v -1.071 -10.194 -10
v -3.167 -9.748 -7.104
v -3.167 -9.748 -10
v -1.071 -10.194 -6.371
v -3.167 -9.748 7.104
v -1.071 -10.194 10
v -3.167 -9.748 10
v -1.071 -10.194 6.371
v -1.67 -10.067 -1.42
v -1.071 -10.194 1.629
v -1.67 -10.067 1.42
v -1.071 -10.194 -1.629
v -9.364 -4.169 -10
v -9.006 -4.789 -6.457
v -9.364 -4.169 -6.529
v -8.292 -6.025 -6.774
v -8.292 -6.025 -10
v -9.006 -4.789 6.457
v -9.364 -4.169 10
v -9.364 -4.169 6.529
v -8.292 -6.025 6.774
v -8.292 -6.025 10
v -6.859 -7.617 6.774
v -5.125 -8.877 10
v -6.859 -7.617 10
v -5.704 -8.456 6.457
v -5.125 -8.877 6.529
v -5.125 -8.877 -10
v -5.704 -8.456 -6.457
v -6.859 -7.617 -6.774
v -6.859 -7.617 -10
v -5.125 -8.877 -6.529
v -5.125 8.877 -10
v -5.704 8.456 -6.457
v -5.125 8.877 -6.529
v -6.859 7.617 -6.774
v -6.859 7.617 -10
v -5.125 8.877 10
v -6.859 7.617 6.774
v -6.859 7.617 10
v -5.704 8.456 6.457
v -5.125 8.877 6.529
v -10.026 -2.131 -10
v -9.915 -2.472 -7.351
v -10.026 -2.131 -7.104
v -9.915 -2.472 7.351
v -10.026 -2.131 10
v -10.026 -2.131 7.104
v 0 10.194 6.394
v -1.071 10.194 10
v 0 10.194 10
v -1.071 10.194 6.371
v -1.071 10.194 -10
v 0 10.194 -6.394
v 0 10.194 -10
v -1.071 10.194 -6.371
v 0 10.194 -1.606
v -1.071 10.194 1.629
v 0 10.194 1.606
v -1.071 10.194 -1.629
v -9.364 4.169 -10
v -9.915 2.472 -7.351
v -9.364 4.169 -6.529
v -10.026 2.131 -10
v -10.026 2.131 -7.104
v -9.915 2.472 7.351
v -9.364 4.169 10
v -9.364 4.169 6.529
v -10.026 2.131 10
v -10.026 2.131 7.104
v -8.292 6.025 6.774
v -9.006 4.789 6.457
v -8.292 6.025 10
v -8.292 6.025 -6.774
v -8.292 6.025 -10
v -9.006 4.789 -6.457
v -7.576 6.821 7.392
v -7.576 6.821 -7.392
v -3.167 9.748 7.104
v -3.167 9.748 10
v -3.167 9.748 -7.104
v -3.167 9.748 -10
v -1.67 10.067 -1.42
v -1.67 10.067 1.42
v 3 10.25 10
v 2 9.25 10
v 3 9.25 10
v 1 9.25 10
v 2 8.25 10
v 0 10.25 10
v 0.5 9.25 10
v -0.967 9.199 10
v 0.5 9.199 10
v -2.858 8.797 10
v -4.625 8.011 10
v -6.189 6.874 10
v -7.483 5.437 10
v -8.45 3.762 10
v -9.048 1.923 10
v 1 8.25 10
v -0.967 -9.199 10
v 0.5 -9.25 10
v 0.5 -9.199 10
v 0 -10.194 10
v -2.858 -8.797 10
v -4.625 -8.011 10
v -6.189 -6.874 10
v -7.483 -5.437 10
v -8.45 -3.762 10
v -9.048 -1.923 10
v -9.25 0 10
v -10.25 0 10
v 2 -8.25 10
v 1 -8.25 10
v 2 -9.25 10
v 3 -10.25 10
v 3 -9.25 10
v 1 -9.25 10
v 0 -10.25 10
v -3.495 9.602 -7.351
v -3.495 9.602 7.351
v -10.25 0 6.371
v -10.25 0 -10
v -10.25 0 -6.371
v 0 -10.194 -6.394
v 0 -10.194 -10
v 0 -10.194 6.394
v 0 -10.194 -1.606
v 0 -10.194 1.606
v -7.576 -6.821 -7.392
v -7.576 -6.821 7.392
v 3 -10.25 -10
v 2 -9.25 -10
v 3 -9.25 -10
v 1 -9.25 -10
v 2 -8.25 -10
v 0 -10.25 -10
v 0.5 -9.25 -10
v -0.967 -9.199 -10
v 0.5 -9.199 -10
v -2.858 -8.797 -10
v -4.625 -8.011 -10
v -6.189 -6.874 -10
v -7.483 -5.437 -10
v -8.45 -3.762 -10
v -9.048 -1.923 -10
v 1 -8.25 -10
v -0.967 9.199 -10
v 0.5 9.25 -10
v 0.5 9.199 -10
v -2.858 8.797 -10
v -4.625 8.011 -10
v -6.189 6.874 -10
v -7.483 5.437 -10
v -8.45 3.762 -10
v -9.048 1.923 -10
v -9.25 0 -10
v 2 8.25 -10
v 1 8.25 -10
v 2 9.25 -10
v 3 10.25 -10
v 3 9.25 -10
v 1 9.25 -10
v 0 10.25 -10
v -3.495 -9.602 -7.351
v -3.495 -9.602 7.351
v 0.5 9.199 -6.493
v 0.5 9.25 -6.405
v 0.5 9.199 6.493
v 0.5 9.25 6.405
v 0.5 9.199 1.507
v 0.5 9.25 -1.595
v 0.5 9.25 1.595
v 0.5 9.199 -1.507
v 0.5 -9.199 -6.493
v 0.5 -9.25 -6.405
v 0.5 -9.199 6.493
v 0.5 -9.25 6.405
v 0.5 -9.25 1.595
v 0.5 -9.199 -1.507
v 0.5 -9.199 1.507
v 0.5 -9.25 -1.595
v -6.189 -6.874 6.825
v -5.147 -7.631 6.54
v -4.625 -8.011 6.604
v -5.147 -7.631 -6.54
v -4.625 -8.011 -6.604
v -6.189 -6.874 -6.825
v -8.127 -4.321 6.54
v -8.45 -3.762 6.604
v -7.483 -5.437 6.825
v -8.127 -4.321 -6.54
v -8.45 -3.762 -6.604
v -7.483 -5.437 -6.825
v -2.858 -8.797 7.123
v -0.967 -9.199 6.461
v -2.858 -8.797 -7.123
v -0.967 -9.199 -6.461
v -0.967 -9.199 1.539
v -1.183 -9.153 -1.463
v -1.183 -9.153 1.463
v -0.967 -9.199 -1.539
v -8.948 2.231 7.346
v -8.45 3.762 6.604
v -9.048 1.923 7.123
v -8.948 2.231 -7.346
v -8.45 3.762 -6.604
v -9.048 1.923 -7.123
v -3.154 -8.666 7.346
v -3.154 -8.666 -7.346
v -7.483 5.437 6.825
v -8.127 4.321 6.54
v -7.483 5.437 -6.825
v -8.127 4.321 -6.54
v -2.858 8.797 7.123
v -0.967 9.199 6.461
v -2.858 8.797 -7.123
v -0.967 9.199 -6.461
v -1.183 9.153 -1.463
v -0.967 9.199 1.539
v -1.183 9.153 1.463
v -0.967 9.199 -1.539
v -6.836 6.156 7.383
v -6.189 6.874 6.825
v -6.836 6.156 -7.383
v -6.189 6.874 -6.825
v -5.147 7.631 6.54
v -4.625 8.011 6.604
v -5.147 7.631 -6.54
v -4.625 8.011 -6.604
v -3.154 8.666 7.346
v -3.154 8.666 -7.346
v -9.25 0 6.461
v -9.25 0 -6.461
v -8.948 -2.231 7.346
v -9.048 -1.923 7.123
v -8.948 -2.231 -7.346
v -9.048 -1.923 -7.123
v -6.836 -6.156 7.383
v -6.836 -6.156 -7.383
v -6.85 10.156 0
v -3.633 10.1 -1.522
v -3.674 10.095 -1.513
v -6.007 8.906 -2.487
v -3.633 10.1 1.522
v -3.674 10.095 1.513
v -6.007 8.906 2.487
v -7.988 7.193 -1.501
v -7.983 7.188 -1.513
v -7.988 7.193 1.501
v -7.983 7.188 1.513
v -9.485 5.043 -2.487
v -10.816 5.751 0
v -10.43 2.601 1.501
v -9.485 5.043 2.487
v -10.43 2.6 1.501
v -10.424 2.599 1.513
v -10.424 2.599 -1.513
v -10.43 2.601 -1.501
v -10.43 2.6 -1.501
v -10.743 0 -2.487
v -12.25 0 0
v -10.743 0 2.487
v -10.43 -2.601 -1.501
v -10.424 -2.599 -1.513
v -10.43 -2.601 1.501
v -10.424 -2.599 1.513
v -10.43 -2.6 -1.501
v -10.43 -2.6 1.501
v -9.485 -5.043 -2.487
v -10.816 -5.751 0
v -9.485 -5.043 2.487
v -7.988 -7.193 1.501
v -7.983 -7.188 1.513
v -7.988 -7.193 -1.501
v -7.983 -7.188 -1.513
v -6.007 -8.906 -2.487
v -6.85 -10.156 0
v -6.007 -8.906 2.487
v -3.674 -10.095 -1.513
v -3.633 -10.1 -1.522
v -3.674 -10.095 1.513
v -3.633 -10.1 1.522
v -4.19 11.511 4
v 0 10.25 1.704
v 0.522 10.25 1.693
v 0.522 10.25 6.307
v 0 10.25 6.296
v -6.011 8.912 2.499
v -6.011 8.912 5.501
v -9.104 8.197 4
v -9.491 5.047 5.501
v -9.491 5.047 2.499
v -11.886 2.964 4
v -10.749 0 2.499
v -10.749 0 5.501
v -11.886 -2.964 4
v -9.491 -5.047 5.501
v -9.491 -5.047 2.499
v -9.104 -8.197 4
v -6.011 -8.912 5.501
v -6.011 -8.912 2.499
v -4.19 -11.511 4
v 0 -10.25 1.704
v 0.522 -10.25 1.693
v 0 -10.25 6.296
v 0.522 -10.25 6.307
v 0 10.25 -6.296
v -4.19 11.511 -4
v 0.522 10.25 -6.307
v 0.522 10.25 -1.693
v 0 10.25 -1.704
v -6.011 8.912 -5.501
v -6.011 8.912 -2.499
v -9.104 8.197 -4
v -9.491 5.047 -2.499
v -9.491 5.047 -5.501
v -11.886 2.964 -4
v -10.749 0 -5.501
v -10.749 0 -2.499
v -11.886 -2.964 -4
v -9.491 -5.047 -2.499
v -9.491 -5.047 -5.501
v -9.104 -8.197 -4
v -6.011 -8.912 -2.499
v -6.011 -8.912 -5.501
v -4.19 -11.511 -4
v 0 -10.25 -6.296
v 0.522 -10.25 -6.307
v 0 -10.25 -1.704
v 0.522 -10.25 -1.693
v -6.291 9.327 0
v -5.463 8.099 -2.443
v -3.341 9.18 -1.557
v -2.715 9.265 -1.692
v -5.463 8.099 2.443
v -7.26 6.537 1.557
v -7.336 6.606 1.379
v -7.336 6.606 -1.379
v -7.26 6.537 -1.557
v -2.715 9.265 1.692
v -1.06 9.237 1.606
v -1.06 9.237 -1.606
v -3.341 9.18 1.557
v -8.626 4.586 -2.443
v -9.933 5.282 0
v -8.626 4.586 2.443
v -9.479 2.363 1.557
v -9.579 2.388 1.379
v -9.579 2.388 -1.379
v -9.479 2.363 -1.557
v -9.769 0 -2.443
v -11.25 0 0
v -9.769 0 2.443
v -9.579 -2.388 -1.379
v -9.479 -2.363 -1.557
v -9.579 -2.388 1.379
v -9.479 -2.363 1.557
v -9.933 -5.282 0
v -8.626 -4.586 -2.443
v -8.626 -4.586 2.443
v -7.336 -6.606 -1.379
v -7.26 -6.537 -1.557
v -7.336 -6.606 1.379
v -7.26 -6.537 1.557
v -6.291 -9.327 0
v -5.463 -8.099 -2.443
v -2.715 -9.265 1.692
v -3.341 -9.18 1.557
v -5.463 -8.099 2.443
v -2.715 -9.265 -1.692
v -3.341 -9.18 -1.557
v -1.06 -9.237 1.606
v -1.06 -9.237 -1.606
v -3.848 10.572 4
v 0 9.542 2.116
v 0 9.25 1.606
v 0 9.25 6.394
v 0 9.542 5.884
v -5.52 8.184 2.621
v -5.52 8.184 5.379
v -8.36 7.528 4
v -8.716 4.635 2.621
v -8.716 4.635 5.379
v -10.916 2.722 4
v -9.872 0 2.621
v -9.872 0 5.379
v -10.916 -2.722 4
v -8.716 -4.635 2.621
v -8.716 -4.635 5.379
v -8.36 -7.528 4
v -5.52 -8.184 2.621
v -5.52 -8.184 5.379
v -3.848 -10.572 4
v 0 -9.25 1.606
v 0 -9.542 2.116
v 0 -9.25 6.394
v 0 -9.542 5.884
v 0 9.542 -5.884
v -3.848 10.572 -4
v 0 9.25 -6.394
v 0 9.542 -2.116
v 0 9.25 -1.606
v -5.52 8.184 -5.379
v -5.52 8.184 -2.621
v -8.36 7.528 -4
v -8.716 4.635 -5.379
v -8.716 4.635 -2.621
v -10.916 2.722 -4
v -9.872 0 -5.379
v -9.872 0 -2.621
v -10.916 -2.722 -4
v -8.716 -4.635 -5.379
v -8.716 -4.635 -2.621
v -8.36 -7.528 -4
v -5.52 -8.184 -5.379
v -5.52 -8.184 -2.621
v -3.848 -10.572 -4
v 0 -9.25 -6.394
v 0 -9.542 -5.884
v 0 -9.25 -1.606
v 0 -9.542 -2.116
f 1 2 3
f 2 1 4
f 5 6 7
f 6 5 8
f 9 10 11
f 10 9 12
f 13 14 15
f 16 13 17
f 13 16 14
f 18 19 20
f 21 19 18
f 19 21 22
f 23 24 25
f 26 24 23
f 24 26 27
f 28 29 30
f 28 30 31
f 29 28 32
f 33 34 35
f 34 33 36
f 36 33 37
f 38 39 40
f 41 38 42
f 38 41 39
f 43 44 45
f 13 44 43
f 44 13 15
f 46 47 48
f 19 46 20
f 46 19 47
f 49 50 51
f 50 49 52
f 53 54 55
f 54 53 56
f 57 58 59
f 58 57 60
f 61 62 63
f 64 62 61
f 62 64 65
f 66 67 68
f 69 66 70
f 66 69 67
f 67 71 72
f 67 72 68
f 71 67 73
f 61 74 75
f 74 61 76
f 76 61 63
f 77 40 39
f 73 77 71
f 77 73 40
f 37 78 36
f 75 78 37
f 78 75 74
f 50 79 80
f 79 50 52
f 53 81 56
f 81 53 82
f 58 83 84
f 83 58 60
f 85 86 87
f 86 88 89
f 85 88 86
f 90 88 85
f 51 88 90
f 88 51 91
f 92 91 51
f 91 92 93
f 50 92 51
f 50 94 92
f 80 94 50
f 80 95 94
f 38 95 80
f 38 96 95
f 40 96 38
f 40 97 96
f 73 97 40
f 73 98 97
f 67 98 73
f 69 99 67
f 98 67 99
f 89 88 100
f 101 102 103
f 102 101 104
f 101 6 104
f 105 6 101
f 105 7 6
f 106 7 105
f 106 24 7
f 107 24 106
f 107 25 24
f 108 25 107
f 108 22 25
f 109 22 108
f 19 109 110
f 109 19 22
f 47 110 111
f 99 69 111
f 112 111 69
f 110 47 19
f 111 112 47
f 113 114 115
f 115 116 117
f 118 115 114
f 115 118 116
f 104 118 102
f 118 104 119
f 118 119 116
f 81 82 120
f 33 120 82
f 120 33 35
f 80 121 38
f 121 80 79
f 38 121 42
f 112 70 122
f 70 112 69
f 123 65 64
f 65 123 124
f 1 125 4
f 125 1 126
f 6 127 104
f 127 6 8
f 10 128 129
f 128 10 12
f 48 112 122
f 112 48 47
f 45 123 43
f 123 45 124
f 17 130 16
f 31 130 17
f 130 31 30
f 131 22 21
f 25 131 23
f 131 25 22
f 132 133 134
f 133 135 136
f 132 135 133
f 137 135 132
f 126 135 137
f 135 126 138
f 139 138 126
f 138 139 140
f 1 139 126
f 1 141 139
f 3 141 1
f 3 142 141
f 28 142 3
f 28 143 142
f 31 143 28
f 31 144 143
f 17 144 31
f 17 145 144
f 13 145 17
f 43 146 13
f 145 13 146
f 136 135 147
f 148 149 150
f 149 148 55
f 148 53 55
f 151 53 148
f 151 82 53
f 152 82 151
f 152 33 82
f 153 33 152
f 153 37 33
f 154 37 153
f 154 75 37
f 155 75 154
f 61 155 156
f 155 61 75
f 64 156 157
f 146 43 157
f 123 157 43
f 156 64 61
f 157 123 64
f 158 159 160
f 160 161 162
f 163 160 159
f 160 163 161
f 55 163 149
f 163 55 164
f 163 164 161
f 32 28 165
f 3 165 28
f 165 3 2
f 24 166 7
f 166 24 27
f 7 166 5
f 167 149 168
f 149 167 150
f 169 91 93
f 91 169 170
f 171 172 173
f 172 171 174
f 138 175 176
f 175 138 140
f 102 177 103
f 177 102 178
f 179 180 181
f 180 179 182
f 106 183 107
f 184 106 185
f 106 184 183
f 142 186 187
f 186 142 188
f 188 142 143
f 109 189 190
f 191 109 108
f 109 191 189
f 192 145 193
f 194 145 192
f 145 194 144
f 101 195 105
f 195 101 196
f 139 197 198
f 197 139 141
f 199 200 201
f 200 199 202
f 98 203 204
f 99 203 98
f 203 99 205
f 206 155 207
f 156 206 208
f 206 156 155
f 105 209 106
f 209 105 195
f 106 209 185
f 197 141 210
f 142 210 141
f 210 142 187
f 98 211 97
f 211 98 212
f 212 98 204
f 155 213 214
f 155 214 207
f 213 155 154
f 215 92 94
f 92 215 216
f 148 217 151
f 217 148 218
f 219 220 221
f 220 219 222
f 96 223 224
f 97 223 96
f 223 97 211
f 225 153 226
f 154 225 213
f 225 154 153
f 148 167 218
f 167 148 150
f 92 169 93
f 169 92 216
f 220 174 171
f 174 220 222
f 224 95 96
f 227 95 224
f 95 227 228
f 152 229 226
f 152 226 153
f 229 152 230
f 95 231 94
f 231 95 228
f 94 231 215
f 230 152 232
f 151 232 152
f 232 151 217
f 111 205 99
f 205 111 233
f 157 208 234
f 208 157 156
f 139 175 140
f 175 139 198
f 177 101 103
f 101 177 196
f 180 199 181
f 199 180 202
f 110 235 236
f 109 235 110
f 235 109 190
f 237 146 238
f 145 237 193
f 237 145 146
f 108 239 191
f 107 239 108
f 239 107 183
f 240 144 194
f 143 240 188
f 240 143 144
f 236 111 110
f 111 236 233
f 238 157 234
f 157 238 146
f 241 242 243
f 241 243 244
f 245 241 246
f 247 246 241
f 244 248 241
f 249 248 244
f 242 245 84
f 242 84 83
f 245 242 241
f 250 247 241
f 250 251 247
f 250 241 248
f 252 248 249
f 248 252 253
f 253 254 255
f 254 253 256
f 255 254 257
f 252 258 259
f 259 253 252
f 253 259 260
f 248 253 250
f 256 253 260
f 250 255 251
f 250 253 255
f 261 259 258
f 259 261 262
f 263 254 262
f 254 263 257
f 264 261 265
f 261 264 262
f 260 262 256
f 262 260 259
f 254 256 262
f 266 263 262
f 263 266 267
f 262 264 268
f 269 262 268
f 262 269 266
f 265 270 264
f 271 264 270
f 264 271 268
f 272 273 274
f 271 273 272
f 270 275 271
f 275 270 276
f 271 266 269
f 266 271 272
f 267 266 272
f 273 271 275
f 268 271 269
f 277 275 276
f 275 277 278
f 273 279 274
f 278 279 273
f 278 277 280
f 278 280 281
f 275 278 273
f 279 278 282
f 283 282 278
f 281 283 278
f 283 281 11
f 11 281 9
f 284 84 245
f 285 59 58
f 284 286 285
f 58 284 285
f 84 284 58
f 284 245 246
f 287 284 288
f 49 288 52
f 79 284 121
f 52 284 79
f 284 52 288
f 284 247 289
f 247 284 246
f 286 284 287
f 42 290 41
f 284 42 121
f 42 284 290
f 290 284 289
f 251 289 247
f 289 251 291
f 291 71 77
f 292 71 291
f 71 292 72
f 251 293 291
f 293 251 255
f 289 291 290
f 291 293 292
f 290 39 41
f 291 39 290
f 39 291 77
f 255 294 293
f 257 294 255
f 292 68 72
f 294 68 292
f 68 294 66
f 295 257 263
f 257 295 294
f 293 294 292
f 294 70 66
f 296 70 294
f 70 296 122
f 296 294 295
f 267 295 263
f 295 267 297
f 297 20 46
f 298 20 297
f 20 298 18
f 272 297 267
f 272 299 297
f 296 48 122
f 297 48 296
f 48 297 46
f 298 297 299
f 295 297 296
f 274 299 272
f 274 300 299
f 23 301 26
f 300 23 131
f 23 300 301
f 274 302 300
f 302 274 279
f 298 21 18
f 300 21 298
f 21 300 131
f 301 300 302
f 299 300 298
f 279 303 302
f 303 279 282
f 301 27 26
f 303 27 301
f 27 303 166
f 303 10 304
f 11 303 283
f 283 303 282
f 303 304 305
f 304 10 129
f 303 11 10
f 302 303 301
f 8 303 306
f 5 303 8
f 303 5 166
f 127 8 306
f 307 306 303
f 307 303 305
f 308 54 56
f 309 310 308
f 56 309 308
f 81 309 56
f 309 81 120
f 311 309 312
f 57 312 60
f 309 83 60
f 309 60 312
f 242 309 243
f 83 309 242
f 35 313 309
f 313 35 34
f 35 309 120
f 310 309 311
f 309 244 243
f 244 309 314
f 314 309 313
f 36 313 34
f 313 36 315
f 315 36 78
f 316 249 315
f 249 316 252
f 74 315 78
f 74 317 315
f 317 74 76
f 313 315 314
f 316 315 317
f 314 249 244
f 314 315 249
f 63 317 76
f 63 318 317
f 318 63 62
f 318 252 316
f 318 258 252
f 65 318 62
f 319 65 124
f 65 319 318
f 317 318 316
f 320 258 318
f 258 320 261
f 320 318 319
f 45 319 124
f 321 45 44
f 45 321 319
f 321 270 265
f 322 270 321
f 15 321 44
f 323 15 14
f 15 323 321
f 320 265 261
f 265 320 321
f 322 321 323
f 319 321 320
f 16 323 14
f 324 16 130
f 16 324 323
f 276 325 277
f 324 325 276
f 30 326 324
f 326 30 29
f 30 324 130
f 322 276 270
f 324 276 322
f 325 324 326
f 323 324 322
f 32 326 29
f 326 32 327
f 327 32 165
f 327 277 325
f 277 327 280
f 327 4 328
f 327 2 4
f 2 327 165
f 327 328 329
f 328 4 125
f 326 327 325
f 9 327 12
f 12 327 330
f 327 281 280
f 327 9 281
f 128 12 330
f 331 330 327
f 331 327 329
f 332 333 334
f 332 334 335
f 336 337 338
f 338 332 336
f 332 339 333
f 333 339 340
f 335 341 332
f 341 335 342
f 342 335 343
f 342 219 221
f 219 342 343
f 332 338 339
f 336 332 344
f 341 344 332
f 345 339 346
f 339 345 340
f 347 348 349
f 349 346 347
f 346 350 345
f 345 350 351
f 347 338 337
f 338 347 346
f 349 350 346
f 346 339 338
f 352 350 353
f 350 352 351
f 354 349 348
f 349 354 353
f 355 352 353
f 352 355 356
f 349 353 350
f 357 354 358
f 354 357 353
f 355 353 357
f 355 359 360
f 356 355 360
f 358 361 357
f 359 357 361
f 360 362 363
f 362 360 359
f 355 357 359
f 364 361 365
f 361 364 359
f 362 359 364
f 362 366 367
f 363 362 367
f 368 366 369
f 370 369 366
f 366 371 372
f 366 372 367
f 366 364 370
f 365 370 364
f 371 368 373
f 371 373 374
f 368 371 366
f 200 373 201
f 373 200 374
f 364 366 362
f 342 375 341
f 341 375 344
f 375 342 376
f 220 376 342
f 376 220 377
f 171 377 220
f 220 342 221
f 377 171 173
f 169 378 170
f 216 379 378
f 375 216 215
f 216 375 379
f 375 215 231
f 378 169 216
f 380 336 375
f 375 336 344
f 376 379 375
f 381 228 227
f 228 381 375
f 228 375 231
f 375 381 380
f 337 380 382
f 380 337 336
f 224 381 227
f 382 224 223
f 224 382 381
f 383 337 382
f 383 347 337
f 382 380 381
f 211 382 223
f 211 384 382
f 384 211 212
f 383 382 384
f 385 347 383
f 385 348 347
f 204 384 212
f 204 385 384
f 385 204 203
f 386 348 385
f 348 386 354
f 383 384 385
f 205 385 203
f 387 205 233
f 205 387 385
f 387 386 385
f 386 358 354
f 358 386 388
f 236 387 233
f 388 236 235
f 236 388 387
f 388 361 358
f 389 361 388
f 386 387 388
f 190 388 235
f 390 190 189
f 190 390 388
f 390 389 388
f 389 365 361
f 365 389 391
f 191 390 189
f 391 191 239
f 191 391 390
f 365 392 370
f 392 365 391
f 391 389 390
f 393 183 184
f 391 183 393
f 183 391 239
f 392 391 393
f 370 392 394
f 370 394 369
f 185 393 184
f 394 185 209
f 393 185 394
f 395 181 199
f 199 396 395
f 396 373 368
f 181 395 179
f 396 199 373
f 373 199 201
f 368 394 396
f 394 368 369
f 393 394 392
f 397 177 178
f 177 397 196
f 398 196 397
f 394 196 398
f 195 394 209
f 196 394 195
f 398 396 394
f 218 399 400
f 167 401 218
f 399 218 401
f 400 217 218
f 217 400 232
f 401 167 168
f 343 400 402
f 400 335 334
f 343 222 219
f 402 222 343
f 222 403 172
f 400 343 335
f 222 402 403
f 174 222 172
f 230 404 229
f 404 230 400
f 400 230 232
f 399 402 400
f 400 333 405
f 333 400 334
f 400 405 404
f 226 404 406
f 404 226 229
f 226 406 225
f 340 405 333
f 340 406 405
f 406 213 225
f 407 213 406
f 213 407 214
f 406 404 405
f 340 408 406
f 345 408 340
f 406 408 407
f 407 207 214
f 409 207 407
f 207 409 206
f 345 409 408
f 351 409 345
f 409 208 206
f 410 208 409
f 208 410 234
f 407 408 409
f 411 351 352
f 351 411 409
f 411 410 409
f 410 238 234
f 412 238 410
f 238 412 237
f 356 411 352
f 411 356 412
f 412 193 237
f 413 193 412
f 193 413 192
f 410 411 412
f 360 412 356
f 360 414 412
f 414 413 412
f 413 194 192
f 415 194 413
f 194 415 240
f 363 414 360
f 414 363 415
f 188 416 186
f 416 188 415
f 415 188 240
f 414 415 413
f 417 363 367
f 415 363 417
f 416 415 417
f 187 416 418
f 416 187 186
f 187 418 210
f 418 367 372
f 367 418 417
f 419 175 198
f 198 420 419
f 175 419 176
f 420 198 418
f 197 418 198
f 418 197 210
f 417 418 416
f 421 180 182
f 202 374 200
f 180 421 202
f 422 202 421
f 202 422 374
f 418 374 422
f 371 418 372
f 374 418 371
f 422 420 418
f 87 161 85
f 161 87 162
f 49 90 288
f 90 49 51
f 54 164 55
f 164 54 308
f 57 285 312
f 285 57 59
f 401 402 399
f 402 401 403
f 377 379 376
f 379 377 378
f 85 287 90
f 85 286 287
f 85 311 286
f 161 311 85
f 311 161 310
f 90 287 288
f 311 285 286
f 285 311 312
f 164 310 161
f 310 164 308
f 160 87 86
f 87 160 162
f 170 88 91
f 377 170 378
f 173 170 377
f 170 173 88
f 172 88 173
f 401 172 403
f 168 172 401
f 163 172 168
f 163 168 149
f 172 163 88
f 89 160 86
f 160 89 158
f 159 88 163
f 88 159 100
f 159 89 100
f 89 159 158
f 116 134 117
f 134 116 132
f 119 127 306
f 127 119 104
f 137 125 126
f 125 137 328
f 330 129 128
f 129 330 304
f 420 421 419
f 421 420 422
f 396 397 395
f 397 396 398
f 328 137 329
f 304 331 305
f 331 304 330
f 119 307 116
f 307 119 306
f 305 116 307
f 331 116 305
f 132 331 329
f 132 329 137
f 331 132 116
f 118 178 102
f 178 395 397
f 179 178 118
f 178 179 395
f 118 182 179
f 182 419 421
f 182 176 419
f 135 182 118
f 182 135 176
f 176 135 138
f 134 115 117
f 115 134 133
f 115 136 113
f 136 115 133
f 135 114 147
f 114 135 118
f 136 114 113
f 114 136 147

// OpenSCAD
baseWidth = 14.5+3*2;
baseHeight = 1.0;
baseLength = 62.5;
//$fs = 0.1;
//$fa = 10;

// TEST SEGMENT
baseLength = 20.0;

lensThickness = 1.0;
lensRadius    = baseWidth/2;

clipAboveHeight     = 1.0;
clipRidgeHeight     = 1.0;
clipBelowHeight     = 1.0;
clipInset           = 1.0;
clipHeight = clipAboveHeight+clipRidgeHeight+clipBelowHeight;
squash              = 1.0;

studBase            = 7;
studHeight          = 3; // keep studHeight <= studBase to keep overhangs <= 45%

module clip()
{
    translate([clipHeight/2,lensRadius-lensThickness/2,0])
      cube([clipHeight,lensThickness,baseLength], center=true);
    translate([clipAboveHeight+clipRidgeHeight/2, lensRadius-lensThickness/2-clipInset/2-lensThickness/2,0])
      cube([clipRidgeHeight,clipInset,baseLength], center=true);
    
}

module lens()
{
  scale([squash,1,1])
    difference() {
      cylinder(h=baseLength, r=lensRadius, center=true);
      translate([lensRadius+1,0,0])
        cube([lensRadius*2+1,lensRadius*2+1,baseLength+1], center=true);
      cylinder(h=baseLength+1, r=lensRadius-lensThickness, center=true);
    }
}

module stud_row(count, offset=0)
{
  studRad = studBase * 1.41421356 / 2.0;
  studAngle = 28;
  studAngle0 = -(count-1)/2*studAngle;

  for (i = [0 : count-1]) {
    rotate(a=studAngle0 + studAngle * i, v=[0,0,1])
      rotate(a=90, v=[0,1,0])
        translate([0,0,-studHeight-lensRadius+lensThickness+offset])
	      cylinder(h=studHeight, r1=0, r2=studRad, $fs=0.1, $fa=60);
  }
}

module stud_rows(offset=0)
{
  stud_row(5,offset);
  translate([0,0,4])
    stud_row(6,offset);
  translate([0,0,-4])
    stud_row(6,offset);

}

module stud_positive()
{
  stud_rows(0);
}

module stud_negative()
{
  stud_rows(1);
}

difference() {
  union() {
    lens();
    stud_positive();
  }
  stud_negative();
}

clip();
mirror([0,1,0])clip();
